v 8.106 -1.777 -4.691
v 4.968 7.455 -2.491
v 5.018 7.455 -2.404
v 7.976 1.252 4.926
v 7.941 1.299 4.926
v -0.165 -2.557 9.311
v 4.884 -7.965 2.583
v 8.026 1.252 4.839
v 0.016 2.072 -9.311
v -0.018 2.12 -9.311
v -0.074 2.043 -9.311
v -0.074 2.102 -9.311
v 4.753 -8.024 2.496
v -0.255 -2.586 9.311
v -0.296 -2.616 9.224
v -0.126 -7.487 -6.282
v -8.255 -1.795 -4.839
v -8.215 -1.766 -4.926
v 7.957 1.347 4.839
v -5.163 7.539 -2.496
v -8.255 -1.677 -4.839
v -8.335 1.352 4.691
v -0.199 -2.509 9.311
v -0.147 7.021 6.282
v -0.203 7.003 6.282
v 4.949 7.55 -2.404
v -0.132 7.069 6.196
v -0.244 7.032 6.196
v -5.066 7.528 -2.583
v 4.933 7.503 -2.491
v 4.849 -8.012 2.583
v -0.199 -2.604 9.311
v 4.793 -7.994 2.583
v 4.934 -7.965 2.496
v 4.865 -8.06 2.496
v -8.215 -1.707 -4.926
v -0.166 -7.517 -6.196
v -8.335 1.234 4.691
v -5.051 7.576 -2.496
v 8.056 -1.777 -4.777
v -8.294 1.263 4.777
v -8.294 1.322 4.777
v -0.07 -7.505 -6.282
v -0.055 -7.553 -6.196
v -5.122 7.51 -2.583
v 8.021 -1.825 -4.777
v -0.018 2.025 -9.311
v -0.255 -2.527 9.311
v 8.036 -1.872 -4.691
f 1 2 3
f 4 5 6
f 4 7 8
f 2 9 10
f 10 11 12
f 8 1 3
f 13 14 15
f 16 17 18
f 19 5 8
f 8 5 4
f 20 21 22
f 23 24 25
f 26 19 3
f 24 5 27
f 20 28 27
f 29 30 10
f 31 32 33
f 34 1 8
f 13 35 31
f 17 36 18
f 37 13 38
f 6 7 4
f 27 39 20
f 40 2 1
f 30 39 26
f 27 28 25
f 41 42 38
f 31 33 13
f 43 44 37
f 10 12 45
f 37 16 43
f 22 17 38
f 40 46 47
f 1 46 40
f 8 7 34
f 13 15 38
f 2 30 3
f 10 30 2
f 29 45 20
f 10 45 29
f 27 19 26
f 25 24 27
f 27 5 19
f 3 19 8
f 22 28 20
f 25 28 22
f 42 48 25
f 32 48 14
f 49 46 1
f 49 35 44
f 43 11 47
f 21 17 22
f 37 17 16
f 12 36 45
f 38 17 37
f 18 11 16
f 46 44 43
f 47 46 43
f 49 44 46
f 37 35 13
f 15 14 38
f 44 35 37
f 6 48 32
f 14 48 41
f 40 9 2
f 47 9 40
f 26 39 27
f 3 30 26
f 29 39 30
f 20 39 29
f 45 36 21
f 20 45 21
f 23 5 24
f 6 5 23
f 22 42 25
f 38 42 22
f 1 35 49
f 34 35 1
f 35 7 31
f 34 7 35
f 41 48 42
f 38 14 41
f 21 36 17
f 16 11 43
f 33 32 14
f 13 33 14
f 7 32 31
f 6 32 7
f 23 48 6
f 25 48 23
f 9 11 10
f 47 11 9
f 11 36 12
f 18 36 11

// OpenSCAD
// Auto-generated OpenSCAD file

    inner_points = 10*[[0.48336147006620667, -0.796491443485512, 0.24961052401954548], [-0.0033636129242731877, 0.20724337779290775, -0.9224172448029275], [-0.02146243534842994, -0.25567359892911584, 0.9224172448029275], [-0.5081875183389098, 0.7480612223493041, -0.24961052401954548], [0.8005548202773529, -0.17771619883438955, -0.46907269909671206], [-0.008558631255711907, -0.7457756765165251, -0.6195514429901602], [-0.01626741701699122, 0.6973454553803171, 0.6195514429901602], [-0.8253808685500561, 0.12928597769818145, 0.46907269909671206], [0.7925798307638832, 0.1251835430715676, 0.4839163595474912], [0.49176718629865324, 0.7455257783134321, -0.24043663734350143], [-0.8174058790365863, -0.1736137642077757, -0.4839163595474912]];

    outer_points = 10*[[0.46952448230116467, 0.8081551775499222, -0.1758990241773695], [0.49043976285885654, -0.8081551775499222, -0.10422353473988513], [-0.49043976285885654, 0.8081551775499222, 0.10422353473988513], [-0.46952448230116467, -0.8081551775499222, 0.1758990241773695], [0.6367153111321443, -0.02307267632934869, -0.7060947254896978], [0.9165394655214069, 0.02307267632934869, 0.2528469041459849], [-0.9165394655214069, -0.02307267632934869, -0.2528469041459849], [-0.6367153111321443, 0.02307267632934869, 0.7060947254896978], [-0.23284567347195917, 0.4621349933977465, -0.7979490193051987], [-0.2199193192030657, -0.5367997424223692, -0.7536511306725492], [0.23284567347195917, -0.4621349933977465, 0.7979490193051987]];

    // Convex hull for inner set (I)
    module inner_hull() {
        hull() {
            for (p = inner_points) {
                translate(p) sphere(r=0.1);
            }
        }
    }

    // Convex hull for outer set (O) minus inner hull (O \ I)
    module outer_minus_inner() {
        difference() {
            hull() {
                for (p = outer_points) {
                    translate(p) sphere(r=0.1);
                }
            }
            inner_hull(); // Subtract inner hull
        }
    }

    // Convex hull for outer set (O) minus all translated inner hulls
    module outer_minus_AllTranslationInner() {
        difference() {
            hull() {
                for (p = outer_points) {
                    translate(p) sphere(r=0.1);
                }
            }
            hull() {
                translate([0,0,50]) inner_hull();
                translate([0,0,-50]) inner_hull();
            }; // Subtract translated inner hulls
        }
    }

    // Difference between outer_minus_inner and outer_minus_AllTranslationInner
    module outer_minus_inner_diff() {
        difference() {
            // Outer minus inner
            difference() {
                hull() {
                    for (p = outer_points) {
                        translate(p) sphere(r=0.1);
                    }
                }
                inner_hull();
            }

            // Subtract Outer minus AllTranslationInner
            difference() {
                hull() {
                    for (p = outer_points) {
                        translate(p) sphere(r=0.1);
                    }
                }
                hull() {
                    translate([0,0,50]) inner_hull();
                    translate([0,0,-50]) inner_hull();
                };
            }
        }
    }

    // Rendering all with colors applied
    color([1, 0, 0, 0.5]) inner_hull(); // Transparent red
    
